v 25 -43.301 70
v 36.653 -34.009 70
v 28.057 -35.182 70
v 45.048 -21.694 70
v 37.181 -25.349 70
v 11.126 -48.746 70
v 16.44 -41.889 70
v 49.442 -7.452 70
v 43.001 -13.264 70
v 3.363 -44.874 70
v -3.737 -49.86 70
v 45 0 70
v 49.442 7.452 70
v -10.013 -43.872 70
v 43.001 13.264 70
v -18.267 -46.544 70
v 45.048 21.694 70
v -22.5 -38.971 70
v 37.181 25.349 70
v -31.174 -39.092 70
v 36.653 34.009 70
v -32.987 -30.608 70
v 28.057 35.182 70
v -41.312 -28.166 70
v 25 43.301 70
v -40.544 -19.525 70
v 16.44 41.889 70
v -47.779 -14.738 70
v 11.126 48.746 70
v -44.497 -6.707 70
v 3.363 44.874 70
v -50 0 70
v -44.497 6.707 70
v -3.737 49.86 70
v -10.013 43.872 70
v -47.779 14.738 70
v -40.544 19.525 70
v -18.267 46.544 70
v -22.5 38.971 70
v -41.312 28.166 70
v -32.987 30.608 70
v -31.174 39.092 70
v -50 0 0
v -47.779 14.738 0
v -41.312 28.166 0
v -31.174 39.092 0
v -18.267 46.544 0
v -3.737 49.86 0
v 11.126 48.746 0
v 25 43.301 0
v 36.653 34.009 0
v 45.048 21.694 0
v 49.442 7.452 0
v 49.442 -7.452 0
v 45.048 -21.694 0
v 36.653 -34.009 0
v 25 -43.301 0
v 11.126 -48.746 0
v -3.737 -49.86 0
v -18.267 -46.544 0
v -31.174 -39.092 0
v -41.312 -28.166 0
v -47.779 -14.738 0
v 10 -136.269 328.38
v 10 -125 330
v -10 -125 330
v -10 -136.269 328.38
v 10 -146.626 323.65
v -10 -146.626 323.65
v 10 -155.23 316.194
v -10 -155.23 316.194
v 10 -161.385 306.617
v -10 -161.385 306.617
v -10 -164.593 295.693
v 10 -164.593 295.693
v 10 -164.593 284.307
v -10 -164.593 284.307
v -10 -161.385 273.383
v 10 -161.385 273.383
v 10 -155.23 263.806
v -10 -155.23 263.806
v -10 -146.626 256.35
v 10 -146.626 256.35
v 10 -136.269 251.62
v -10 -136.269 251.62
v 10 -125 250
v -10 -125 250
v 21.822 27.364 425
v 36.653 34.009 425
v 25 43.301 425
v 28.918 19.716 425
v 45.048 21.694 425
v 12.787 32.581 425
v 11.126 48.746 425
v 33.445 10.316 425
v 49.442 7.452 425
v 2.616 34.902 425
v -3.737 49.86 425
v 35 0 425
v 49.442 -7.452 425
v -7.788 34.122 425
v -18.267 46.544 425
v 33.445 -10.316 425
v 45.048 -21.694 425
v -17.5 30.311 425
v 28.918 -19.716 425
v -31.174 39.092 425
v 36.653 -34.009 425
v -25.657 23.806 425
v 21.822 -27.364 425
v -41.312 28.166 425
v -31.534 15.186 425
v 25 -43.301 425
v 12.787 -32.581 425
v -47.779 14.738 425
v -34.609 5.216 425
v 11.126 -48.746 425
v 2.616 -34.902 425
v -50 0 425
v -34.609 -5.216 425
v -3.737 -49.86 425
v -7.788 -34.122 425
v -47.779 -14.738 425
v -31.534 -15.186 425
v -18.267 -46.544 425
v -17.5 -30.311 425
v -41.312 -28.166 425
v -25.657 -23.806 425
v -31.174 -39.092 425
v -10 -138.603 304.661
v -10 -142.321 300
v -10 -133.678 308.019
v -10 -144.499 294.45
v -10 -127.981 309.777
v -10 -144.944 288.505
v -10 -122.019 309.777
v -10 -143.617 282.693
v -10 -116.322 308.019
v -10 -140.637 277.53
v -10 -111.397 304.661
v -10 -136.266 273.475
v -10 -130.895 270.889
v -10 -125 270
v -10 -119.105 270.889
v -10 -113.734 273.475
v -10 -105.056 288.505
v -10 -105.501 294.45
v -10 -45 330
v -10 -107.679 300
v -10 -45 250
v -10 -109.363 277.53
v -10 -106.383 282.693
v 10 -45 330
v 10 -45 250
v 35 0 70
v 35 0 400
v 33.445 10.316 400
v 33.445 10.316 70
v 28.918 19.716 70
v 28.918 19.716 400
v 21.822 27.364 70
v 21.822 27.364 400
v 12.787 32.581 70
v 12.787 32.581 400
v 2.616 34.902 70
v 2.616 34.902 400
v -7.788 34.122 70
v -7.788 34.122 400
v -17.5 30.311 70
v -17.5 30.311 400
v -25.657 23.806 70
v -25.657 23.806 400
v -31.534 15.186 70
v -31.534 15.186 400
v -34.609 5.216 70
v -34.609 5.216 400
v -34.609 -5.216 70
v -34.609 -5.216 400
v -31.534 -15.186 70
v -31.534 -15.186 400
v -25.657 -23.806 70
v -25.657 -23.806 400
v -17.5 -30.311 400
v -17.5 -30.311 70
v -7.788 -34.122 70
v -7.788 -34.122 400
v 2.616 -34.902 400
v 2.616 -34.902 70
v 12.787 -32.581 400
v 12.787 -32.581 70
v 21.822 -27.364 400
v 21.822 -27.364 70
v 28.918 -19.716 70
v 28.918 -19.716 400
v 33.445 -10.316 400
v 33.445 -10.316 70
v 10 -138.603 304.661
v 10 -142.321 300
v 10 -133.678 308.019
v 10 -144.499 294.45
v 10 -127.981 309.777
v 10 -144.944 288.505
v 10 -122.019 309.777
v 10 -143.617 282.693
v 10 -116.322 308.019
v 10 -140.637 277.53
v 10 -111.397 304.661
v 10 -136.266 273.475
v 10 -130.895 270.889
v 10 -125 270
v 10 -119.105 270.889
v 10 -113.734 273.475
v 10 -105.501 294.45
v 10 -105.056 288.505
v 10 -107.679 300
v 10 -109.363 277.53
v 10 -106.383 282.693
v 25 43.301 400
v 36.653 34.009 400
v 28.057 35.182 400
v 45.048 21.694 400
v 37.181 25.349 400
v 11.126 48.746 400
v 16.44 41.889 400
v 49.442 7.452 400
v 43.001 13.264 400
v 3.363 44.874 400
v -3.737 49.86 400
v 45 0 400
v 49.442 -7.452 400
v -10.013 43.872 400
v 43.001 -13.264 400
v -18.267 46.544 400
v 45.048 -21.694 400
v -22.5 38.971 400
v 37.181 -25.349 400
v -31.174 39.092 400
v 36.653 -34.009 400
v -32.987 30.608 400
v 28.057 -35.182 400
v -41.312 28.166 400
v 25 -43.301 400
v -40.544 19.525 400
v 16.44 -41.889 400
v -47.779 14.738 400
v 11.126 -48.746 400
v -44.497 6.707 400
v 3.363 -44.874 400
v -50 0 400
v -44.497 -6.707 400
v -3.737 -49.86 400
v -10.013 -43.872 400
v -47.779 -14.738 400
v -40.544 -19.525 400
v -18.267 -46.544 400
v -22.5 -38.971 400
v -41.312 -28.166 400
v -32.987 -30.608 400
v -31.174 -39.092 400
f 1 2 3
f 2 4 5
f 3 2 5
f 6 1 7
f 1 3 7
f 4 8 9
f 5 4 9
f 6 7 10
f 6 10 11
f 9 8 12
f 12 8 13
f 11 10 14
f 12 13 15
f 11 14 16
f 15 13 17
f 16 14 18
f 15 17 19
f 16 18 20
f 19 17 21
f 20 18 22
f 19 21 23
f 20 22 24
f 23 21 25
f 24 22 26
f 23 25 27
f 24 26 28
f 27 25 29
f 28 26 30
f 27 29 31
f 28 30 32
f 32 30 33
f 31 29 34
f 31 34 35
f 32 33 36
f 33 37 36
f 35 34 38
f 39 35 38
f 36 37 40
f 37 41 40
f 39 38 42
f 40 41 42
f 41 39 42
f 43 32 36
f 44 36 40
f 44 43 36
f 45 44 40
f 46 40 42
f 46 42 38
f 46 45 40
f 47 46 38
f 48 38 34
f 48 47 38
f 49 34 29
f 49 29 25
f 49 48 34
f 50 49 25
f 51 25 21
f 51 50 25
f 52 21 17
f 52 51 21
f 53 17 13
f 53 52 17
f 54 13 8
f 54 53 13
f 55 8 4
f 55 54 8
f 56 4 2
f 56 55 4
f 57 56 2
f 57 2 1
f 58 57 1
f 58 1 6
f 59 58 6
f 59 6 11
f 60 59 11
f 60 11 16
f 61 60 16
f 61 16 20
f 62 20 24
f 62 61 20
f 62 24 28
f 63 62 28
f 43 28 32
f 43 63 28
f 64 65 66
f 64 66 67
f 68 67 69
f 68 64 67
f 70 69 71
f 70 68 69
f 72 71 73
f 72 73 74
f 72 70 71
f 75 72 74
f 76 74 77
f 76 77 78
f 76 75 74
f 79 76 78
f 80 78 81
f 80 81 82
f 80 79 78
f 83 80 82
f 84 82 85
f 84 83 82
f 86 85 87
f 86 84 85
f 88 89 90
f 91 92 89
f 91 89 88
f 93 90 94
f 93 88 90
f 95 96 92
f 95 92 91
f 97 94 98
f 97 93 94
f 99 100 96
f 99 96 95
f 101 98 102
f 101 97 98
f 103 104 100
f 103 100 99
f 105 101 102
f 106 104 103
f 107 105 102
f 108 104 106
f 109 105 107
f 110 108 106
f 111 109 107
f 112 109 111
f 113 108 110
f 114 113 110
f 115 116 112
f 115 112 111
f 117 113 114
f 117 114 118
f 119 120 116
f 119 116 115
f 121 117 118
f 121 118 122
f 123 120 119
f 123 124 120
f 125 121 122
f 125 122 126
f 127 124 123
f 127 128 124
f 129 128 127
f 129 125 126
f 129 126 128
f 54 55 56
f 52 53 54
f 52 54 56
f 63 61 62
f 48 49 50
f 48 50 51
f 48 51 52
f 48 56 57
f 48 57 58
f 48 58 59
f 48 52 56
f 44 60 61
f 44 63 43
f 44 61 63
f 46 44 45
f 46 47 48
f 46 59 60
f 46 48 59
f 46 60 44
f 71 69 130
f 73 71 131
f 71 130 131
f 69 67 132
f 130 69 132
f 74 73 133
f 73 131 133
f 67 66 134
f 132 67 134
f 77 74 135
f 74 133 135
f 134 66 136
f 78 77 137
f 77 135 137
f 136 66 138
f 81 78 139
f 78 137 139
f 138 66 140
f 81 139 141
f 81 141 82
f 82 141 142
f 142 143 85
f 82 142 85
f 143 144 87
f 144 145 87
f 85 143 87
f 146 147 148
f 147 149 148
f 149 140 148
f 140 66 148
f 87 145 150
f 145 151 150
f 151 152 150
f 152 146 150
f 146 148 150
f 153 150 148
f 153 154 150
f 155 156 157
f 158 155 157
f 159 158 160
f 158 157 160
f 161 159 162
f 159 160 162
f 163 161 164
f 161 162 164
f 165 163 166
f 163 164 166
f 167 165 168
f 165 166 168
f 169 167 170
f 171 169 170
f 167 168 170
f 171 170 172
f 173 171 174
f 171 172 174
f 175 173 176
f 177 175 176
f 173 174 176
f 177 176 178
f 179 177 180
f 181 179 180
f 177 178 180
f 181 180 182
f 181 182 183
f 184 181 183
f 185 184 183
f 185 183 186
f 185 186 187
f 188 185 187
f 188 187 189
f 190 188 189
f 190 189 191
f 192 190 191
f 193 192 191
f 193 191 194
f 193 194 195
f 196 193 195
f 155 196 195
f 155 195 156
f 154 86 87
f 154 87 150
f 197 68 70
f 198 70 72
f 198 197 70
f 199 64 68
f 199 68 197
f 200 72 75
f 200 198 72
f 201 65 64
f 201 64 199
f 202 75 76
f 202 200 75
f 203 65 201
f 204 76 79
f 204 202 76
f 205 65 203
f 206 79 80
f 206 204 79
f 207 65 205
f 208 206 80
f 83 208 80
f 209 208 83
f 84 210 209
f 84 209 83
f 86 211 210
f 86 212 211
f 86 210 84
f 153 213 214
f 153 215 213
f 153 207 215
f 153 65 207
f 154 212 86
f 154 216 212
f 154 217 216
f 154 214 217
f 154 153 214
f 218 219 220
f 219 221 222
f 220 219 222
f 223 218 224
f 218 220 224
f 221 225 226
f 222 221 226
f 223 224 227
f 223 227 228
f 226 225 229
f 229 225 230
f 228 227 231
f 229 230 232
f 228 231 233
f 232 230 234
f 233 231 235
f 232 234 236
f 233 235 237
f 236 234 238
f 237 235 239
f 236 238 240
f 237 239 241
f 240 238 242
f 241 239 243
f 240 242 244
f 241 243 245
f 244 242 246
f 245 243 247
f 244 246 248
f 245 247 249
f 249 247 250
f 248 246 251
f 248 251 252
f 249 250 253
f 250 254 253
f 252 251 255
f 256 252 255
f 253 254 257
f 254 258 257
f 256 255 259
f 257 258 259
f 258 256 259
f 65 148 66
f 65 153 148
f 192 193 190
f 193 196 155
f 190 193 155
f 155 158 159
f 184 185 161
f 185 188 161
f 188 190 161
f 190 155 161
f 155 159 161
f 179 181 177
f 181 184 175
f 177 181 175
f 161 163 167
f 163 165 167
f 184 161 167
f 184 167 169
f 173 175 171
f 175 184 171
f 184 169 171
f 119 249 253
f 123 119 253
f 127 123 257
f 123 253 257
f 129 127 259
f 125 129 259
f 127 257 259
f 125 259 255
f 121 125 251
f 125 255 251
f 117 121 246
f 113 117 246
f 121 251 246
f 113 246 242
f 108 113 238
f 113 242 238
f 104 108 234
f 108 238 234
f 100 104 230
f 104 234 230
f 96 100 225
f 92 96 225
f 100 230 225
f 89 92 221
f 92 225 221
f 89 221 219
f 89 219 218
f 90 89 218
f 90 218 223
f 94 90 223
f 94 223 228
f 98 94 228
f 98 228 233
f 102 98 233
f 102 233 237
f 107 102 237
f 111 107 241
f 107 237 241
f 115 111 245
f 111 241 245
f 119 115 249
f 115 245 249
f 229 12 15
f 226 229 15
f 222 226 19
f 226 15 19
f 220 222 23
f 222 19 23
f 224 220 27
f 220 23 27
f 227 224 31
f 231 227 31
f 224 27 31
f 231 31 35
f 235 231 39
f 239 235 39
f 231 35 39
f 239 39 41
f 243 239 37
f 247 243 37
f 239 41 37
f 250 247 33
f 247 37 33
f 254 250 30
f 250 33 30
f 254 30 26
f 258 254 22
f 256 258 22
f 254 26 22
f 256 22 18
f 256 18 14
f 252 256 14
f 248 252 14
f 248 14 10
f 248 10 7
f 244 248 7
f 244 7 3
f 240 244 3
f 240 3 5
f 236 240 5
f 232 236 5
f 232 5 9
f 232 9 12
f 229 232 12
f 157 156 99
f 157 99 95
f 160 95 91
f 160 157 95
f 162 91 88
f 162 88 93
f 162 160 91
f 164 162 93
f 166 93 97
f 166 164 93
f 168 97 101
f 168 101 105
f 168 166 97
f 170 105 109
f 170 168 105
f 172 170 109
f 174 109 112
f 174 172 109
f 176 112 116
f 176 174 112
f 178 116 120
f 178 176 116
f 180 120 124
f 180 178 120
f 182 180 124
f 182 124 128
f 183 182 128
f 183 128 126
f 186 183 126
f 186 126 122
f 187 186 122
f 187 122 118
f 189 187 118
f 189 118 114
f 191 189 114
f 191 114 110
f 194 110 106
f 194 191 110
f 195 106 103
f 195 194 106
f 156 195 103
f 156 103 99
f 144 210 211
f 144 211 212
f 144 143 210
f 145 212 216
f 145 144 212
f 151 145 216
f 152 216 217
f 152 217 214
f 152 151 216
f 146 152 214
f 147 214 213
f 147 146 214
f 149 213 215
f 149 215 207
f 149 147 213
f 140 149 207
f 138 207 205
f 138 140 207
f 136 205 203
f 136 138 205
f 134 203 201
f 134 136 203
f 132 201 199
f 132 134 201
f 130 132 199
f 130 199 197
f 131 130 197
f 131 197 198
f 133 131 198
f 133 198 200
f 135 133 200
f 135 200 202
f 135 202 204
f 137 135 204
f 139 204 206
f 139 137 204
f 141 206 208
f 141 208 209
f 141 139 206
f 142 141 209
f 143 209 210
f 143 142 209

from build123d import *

# Parameters (mm, degrees)
IZIM1_R                     = 45
Y_KSEKLIK_EKSTR_ZYON1_DEPTH = 400
IZIM2_R                     = 35
KES_EKSTR_ZYON1_DEPTH       = 350
IZIM4_R                     = 50
Y_KSEKLIK_EKSTR_ZYON2_DEPTH = 70
IZIM6_R                     = 50
IZIM6_R_2                   = 35
Y_KSEKLIK_EKSTR_ZYON4_DEPTH = 25
IZIM5_R                     = 20
Y_KSEKLIK_EKSTR_ZYON5_DEPTH = 10


with BuildPart() as part:
    # Çizim1 → Yükseklik-Ekstrüzyon1 (new body)
    with BuildSketch(Plane.XY):
        Circle(IZIM1_R)
    extrude(amount=Y_KSEKLIK_EKSTR_ZYON1_DEPTH)

    # Çizim2 → Kes-Ekstrüzyon1 (cut)
    with BuildSketch(Plane.XY.offset(400)):
        Circle(IZIM2_R)
    extrude(amount=-KES_EKSTR_ZYON1_DEPTH, mode=Mode.SUBTRACT)

    # Çizim4 → Yükseklik-Ekstrüzyon2 (add)
    with BuildSketch(Plane(origin=(0, 0, 0), x_dir=(-1, 0, 0), z_dir=(0, 0, -1))):
        Circle(IZIM4_R)
    extrude(amount=-Y_KSEKLIK_EKSTR_ZYON2_DEPTH)

    # Çizim6 → Yükseklik-Ekstrüzyon4 (add)
    with BuildSketch(Plane.XY.offset(400)):
        with Locations(Location((0, 0, 0), (0, 0, 180))):
            Circle(IZIM6_R)
        Circle(IZIM6_R_2, mode=Mode.SUBTRACT)
    extrude(amount=Y_KSEKLIK_EKSTR_ZYON4_DEPTH)


with BuildPart() as body_2:
    # Çizim5 → Yükseklik-Ekstrüzyon5 (new, symmetric)
    with BuildSketch(Plane(origin=(0, 0, 0), x_dir=(0, 0, -1), z_dir=(1, 0, 0))):
        with BuildLine():
            Line((-330, -45), (-330, -125))
            ThreePointArc((-330, -125), (-290, -165), (-250, -125))
            Line((-250, -125), (-250, -45))
            Line((-250, -45), (-330, -45))
        make_face()
        with Locations((-290, -125)):
            Circle(IZIM5_R, mode=Mode.SUBTRACT)
    extrude(amount=Y_KSEKLIK_EKSTR_ZYON5_DEPTH, both=True)


solid = Compound([part.part, body_2.part])
